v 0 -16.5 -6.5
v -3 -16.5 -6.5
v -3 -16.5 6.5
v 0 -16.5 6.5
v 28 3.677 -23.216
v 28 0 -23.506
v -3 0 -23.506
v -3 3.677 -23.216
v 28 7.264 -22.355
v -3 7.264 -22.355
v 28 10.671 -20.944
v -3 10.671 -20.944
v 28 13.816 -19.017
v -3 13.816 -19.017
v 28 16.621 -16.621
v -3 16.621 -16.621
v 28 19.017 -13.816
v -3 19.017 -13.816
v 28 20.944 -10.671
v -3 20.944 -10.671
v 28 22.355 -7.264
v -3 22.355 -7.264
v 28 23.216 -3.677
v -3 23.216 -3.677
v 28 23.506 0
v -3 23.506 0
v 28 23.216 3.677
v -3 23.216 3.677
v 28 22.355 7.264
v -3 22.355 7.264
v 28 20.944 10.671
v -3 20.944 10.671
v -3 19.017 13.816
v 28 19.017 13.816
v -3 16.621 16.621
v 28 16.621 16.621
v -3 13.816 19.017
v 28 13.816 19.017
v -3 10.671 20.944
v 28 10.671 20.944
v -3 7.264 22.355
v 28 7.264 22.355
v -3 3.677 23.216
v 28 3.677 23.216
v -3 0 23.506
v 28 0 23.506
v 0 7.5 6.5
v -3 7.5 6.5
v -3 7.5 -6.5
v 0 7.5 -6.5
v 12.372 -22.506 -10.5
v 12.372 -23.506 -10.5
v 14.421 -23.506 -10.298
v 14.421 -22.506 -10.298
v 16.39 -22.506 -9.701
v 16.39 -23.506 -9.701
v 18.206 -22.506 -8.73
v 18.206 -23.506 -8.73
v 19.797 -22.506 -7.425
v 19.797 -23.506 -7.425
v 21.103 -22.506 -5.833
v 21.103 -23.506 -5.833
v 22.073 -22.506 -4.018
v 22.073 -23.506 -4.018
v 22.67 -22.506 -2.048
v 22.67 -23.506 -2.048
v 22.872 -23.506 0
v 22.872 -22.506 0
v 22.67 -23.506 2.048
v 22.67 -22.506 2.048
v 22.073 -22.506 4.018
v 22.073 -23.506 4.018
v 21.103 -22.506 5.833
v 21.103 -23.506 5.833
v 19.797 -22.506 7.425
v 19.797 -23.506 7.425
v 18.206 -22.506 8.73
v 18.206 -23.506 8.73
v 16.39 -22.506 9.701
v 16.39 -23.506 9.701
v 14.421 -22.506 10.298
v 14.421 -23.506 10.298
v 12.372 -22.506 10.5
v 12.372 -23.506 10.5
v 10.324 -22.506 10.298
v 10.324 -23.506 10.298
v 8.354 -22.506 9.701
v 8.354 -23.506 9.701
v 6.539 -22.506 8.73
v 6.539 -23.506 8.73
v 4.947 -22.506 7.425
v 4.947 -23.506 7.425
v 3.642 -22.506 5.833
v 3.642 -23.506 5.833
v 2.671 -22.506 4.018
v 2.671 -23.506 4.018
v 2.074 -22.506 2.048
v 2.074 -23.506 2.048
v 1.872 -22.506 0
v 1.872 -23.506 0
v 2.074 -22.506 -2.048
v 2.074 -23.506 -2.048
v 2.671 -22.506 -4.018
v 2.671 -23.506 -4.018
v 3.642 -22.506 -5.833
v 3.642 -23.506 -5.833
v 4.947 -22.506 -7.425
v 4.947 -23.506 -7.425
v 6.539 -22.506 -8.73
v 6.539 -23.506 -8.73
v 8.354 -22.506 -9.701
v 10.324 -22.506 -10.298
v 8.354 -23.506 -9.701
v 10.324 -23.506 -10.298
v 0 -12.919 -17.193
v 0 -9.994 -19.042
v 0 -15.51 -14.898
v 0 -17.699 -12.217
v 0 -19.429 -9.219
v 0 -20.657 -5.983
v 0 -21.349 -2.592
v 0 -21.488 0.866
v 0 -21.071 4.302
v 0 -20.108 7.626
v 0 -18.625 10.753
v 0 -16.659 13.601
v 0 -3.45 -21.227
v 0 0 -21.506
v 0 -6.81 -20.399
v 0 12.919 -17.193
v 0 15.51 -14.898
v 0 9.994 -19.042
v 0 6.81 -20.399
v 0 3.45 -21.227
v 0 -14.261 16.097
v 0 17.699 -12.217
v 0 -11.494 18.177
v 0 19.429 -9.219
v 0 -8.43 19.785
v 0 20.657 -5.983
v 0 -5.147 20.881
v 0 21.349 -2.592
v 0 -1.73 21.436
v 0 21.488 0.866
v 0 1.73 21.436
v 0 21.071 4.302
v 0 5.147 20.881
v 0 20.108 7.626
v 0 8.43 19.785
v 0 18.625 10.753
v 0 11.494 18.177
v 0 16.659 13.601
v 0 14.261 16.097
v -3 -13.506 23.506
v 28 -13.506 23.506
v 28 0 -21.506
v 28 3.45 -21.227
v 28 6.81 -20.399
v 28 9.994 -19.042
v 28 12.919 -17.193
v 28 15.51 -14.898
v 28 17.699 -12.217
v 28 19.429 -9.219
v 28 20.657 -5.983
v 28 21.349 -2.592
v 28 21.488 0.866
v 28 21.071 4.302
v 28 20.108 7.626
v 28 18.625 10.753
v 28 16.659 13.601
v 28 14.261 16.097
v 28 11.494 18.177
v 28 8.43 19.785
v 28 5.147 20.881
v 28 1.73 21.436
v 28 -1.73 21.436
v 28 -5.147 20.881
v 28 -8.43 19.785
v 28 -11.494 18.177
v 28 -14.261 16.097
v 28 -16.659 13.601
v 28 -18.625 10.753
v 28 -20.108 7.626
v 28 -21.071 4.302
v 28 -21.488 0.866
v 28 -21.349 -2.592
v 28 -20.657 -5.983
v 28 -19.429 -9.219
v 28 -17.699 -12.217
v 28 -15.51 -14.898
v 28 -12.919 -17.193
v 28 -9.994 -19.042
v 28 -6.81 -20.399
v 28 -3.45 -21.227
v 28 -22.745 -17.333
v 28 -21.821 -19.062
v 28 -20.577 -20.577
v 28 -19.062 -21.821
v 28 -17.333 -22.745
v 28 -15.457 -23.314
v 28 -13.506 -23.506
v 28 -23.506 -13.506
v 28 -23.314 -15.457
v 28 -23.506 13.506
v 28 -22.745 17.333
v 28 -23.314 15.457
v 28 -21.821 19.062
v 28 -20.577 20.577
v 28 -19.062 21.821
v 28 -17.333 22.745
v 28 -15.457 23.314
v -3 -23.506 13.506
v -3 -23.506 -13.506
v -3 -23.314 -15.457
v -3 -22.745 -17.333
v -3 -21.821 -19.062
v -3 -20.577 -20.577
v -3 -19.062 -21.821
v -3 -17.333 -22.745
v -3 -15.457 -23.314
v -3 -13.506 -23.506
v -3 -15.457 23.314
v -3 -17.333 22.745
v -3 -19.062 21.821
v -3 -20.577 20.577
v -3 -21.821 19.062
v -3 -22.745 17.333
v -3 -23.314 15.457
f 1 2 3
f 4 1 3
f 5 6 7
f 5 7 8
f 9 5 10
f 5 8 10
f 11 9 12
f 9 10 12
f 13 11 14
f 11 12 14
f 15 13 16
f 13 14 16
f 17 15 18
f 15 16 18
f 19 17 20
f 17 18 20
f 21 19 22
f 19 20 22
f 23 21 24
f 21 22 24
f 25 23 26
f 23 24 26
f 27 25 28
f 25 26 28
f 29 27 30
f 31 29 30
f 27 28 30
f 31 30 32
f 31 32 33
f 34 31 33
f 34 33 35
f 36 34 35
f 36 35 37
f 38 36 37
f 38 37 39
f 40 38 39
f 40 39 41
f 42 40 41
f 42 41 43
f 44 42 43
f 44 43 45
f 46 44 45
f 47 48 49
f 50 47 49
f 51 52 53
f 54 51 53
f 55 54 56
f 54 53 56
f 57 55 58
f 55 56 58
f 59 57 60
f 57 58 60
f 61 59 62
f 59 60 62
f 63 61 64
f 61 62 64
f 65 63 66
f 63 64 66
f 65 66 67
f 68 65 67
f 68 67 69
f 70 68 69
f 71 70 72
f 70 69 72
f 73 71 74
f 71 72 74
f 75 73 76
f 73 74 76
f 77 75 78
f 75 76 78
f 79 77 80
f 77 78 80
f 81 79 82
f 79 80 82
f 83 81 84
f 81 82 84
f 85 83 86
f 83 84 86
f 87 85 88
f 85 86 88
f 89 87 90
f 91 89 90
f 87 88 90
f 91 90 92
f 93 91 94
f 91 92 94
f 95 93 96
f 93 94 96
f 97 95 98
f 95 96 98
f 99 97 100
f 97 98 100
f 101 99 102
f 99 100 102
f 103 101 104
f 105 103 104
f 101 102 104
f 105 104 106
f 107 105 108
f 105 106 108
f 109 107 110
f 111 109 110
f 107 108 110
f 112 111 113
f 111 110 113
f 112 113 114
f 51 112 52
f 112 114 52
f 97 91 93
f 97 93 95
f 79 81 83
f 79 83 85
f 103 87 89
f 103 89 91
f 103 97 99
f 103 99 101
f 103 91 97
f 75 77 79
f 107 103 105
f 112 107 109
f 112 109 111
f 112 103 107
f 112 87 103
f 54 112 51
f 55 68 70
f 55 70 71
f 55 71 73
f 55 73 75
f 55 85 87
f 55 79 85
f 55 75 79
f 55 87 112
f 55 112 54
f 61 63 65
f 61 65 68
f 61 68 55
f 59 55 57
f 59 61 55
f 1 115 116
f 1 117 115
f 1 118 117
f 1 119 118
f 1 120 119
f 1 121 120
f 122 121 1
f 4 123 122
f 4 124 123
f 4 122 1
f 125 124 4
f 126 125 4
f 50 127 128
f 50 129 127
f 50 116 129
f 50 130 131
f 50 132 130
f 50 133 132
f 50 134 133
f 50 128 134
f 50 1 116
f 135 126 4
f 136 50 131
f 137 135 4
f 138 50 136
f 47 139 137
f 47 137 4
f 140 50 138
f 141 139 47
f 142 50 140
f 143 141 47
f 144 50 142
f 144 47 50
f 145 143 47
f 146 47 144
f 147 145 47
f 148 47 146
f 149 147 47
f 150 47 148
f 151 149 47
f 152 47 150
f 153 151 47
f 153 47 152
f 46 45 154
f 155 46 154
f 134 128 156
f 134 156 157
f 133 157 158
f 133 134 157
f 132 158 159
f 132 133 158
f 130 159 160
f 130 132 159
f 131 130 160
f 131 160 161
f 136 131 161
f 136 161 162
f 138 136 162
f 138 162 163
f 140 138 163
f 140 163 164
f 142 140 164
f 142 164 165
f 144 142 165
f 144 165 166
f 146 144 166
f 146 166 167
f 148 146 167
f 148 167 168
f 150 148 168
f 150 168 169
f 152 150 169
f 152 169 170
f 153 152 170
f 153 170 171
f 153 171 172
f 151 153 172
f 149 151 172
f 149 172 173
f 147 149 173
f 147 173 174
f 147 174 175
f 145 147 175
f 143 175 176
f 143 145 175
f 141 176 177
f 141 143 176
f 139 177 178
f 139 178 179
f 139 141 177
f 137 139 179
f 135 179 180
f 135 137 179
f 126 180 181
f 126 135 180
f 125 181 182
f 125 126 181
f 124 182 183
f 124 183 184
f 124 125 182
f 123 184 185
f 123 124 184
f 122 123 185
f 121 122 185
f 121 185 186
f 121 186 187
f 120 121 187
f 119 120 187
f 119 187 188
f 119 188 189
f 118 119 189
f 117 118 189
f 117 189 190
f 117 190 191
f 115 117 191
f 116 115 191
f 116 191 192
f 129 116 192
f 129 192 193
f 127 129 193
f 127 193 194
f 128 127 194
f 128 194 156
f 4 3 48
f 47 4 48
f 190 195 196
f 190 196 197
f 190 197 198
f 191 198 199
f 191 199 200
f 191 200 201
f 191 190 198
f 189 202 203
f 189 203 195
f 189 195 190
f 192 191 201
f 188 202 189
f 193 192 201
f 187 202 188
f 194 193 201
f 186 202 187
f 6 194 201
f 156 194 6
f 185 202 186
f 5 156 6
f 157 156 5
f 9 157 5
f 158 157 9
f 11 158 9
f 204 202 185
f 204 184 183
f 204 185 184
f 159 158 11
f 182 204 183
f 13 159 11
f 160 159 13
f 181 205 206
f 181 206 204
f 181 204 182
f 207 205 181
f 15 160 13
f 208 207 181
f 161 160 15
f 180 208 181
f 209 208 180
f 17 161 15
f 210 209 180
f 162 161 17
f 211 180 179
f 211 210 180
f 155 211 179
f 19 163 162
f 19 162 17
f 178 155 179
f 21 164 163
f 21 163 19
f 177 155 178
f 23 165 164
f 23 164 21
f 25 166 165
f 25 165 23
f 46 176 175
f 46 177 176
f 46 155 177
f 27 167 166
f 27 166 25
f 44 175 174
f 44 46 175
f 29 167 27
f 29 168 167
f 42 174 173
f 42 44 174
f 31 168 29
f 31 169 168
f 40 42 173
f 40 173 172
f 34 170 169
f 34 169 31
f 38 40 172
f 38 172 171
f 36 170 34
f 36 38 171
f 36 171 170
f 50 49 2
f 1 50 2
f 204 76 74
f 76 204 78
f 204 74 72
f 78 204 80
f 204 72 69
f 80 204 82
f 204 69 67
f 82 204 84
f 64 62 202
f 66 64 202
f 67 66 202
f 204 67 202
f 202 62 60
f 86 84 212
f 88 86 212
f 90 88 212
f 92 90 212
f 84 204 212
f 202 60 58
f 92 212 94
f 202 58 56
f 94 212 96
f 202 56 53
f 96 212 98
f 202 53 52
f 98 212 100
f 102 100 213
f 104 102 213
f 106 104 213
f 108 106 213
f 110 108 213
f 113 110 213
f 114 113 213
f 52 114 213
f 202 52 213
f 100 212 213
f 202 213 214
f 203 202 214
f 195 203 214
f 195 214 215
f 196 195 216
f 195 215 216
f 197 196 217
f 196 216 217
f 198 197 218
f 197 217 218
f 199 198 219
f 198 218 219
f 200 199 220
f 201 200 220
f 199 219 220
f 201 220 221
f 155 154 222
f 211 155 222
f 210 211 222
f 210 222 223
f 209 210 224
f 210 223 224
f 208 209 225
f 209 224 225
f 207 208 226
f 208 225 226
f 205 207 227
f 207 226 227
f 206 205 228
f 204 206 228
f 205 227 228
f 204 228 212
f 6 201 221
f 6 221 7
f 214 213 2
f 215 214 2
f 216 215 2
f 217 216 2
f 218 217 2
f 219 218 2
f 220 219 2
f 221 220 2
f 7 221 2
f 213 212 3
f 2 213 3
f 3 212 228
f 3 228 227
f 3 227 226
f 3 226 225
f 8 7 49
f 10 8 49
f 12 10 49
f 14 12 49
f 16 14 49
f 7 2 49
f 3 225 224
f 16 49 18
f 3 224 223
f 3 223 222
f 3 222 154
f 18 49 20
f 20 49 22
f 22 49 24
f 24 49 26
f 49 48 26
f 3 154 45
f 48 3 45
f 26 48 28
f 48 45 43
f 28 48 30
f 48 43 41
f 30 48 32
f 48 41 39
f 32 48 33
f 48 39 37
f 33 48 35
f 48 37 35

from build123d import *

# Parameters (mm, degrees)
SKETCH1_R           = 23.505813168
SKETCH1_R_2         = 21.505813168
BOSS_EXTRUDE1_DEPTH = 28
BOSS_EXTRUDE4_START = -3
SKETCH1_6_R         = 23.505813168
SKETCH1_6_R_2       = 21.505813168
SKETCH1_6_W         = 4
SKETCH1_6_H         = 13
BOSS_EXTRUDE4_DEPTH = 3
BOSS_EXTRUDE5_START = -31
BOSS_EXTRUDE5_DEPTH = 31
SKETCH3_R           = 10.5
CUT_EXTRUDE4_DEPTH  = 1


with BuildPart() as part:
    # Sketch1 → Boss-Extrude1 (new body)
    with BuildSketch(Plane.YZ):
        with Locations(Location((0, 0, 0), (0, 0, 270))):
            Circle(SKETCH1_R)
        with Locations(Location((0, 0, 0), (0, 0, 270))):
            Circle(SKETCH1_R_2, mode=Mode.SUBTRACT)
    extrude(amount=BOSS_EXTRUDE1_DEPTH)

    # Sketch1<6> → Boss-Extrude4 (add)
    # profile 1 of 5: a face of its own
    with BuildSketch(Plane.YZ.offset(BOSS_EXTRUDE4_START)):
        with Locations(Location((0, 0, 0), (0, 0, 270))):
            Circle(SKETCH1_6_R)
        with Locations(Location((0, 0, 0), (0, 0, 270))):
            Circle(SKETCH1_6_R_2, mode=Mode.SUBTRACT)
    # profile 2 of 5: a face of its own
    with BuildSketch(Plane.YZ.offset(BOSS_EXTRUDE4_START)):
        with BuildLine():
            Line((-20.5, -6.5), (-20.5, 6.5))
            ThreePointArc((-20.5, 6.5), (-21.505813168, 0), (-20.5, -6.5))
        make_face()
    # profile 3 of 5: a face of its own
    with BuildSketch(Plane.YZ.offset(BOSS_EXTRUDE4_START)):
        with Locations((-18.5, 0)):
            Rectangle(SKETCH1_6_W, SKETCH1_6_H)
    # profile 4 of 5: a face of its own
    with BuildSketch(Plane.YZ.offset(BOSS_EXTRUDE4_START)):
        with BuildLine():
            Line((-20.5, 6.5), (-16.5, 6.5))
            Line((-16.5, 6.5), (-7.925433742, 6.5))
            ThreePointArc((-7.925433742, 6.5), (3.451579649, 9.651378033), (10.25, 0))
            ThreePointArc((10.25, 0), (3.451579649, -9.651378033), (-7.925433742, -6.5))
            Line((-7.925433742, -6.5), (-16.5, -6.5))
            Line((-16.5, -6.5), (-20.5, -6.5))
            ThreePointArc((-20.5, -6.5), (3.288679831, -21.252872393), (21.505813168, 0))
            ThreePointArc((21.505813168, 0), (3.288679831, 21.252872393), (-20.5, 6.5))
        make_face()
    # profile 5 of 5: a face of its own
    with BuildSketch(Plane.YZ.offset(BOSS_EXTRUDE4_START)):
        with BuildLine():
            ThreePointArc((10.25, 0), (3.451579649, 9.651378033), (-7.925433742, 6.5))
            Line((-7.925433742, 6.5), (0, 6.5))
            Line((0, 6.5), (7.5, 6.5))
            Line((7.5, 6.5), (7.5, -6.5))
            Line((7.5, -6.5), (0, -6.5))
            Line((0, -6.5), (-7.925433742, -6.5))
            ThreePointArc((-7.925433742, -6.5), (3.451579649, -9.651378033), (10.25, 0))
        make_face()
    extrude(amount=BOSS_EXTRUDE4_DEPTH)

    # Sketch2 → Boss-Extrude5 (add)
    with BuildSketch(Plane.YZ.offset(28).offset(BOSS_EXTRUDE5_START)):
        with BuildLine():
            ThreePointArc((-23.505813168, 0), (-16.621119888, 16.621119888), (0, 23.505813168))
            Line((0, 23.505813168), (-13.505813168, 23.505813168))
            ThreePointArc((-13.505813168, 23.505813168), (-20.576880979, 20.576880979), (-23.505813168, 13.505813168))
            Line((-23.505813168, 13.505813168), (-23.505813168, 0))
        make_face()
        with BuildLine():
            ThreePointArc((0, -23.505813168), (-16.621119888, -16.621119888), (-23.505813168, 0))
            Line((-23.505813168, 0), (-23.505813168, -13.505813168))
            ThreePointArc((-23.505813168, -13.505813168), (-20.576880979, -20.576880979), (-13.505813168, -23.505813168))
            Line((-13.505813168, -23.505813168), (0, -23.505813168))
        make_face()
    extrude(amount=BOSS_EXTRUDE5_DEPTH)

    # Sketch3 → Cut-Extrude4 (cut)
    with BuildSketch(Plane.XZ.offset(23.505813168)):
        with Locations(Location((12.372081248, 0, 0), (0, 0, 270))):
            Circle(SKETCH3_R)
    extrude(amount=-CUT_EXTRUDE4_DEPTH, mode=Mode.SUBTRACT)


solid = part.part
